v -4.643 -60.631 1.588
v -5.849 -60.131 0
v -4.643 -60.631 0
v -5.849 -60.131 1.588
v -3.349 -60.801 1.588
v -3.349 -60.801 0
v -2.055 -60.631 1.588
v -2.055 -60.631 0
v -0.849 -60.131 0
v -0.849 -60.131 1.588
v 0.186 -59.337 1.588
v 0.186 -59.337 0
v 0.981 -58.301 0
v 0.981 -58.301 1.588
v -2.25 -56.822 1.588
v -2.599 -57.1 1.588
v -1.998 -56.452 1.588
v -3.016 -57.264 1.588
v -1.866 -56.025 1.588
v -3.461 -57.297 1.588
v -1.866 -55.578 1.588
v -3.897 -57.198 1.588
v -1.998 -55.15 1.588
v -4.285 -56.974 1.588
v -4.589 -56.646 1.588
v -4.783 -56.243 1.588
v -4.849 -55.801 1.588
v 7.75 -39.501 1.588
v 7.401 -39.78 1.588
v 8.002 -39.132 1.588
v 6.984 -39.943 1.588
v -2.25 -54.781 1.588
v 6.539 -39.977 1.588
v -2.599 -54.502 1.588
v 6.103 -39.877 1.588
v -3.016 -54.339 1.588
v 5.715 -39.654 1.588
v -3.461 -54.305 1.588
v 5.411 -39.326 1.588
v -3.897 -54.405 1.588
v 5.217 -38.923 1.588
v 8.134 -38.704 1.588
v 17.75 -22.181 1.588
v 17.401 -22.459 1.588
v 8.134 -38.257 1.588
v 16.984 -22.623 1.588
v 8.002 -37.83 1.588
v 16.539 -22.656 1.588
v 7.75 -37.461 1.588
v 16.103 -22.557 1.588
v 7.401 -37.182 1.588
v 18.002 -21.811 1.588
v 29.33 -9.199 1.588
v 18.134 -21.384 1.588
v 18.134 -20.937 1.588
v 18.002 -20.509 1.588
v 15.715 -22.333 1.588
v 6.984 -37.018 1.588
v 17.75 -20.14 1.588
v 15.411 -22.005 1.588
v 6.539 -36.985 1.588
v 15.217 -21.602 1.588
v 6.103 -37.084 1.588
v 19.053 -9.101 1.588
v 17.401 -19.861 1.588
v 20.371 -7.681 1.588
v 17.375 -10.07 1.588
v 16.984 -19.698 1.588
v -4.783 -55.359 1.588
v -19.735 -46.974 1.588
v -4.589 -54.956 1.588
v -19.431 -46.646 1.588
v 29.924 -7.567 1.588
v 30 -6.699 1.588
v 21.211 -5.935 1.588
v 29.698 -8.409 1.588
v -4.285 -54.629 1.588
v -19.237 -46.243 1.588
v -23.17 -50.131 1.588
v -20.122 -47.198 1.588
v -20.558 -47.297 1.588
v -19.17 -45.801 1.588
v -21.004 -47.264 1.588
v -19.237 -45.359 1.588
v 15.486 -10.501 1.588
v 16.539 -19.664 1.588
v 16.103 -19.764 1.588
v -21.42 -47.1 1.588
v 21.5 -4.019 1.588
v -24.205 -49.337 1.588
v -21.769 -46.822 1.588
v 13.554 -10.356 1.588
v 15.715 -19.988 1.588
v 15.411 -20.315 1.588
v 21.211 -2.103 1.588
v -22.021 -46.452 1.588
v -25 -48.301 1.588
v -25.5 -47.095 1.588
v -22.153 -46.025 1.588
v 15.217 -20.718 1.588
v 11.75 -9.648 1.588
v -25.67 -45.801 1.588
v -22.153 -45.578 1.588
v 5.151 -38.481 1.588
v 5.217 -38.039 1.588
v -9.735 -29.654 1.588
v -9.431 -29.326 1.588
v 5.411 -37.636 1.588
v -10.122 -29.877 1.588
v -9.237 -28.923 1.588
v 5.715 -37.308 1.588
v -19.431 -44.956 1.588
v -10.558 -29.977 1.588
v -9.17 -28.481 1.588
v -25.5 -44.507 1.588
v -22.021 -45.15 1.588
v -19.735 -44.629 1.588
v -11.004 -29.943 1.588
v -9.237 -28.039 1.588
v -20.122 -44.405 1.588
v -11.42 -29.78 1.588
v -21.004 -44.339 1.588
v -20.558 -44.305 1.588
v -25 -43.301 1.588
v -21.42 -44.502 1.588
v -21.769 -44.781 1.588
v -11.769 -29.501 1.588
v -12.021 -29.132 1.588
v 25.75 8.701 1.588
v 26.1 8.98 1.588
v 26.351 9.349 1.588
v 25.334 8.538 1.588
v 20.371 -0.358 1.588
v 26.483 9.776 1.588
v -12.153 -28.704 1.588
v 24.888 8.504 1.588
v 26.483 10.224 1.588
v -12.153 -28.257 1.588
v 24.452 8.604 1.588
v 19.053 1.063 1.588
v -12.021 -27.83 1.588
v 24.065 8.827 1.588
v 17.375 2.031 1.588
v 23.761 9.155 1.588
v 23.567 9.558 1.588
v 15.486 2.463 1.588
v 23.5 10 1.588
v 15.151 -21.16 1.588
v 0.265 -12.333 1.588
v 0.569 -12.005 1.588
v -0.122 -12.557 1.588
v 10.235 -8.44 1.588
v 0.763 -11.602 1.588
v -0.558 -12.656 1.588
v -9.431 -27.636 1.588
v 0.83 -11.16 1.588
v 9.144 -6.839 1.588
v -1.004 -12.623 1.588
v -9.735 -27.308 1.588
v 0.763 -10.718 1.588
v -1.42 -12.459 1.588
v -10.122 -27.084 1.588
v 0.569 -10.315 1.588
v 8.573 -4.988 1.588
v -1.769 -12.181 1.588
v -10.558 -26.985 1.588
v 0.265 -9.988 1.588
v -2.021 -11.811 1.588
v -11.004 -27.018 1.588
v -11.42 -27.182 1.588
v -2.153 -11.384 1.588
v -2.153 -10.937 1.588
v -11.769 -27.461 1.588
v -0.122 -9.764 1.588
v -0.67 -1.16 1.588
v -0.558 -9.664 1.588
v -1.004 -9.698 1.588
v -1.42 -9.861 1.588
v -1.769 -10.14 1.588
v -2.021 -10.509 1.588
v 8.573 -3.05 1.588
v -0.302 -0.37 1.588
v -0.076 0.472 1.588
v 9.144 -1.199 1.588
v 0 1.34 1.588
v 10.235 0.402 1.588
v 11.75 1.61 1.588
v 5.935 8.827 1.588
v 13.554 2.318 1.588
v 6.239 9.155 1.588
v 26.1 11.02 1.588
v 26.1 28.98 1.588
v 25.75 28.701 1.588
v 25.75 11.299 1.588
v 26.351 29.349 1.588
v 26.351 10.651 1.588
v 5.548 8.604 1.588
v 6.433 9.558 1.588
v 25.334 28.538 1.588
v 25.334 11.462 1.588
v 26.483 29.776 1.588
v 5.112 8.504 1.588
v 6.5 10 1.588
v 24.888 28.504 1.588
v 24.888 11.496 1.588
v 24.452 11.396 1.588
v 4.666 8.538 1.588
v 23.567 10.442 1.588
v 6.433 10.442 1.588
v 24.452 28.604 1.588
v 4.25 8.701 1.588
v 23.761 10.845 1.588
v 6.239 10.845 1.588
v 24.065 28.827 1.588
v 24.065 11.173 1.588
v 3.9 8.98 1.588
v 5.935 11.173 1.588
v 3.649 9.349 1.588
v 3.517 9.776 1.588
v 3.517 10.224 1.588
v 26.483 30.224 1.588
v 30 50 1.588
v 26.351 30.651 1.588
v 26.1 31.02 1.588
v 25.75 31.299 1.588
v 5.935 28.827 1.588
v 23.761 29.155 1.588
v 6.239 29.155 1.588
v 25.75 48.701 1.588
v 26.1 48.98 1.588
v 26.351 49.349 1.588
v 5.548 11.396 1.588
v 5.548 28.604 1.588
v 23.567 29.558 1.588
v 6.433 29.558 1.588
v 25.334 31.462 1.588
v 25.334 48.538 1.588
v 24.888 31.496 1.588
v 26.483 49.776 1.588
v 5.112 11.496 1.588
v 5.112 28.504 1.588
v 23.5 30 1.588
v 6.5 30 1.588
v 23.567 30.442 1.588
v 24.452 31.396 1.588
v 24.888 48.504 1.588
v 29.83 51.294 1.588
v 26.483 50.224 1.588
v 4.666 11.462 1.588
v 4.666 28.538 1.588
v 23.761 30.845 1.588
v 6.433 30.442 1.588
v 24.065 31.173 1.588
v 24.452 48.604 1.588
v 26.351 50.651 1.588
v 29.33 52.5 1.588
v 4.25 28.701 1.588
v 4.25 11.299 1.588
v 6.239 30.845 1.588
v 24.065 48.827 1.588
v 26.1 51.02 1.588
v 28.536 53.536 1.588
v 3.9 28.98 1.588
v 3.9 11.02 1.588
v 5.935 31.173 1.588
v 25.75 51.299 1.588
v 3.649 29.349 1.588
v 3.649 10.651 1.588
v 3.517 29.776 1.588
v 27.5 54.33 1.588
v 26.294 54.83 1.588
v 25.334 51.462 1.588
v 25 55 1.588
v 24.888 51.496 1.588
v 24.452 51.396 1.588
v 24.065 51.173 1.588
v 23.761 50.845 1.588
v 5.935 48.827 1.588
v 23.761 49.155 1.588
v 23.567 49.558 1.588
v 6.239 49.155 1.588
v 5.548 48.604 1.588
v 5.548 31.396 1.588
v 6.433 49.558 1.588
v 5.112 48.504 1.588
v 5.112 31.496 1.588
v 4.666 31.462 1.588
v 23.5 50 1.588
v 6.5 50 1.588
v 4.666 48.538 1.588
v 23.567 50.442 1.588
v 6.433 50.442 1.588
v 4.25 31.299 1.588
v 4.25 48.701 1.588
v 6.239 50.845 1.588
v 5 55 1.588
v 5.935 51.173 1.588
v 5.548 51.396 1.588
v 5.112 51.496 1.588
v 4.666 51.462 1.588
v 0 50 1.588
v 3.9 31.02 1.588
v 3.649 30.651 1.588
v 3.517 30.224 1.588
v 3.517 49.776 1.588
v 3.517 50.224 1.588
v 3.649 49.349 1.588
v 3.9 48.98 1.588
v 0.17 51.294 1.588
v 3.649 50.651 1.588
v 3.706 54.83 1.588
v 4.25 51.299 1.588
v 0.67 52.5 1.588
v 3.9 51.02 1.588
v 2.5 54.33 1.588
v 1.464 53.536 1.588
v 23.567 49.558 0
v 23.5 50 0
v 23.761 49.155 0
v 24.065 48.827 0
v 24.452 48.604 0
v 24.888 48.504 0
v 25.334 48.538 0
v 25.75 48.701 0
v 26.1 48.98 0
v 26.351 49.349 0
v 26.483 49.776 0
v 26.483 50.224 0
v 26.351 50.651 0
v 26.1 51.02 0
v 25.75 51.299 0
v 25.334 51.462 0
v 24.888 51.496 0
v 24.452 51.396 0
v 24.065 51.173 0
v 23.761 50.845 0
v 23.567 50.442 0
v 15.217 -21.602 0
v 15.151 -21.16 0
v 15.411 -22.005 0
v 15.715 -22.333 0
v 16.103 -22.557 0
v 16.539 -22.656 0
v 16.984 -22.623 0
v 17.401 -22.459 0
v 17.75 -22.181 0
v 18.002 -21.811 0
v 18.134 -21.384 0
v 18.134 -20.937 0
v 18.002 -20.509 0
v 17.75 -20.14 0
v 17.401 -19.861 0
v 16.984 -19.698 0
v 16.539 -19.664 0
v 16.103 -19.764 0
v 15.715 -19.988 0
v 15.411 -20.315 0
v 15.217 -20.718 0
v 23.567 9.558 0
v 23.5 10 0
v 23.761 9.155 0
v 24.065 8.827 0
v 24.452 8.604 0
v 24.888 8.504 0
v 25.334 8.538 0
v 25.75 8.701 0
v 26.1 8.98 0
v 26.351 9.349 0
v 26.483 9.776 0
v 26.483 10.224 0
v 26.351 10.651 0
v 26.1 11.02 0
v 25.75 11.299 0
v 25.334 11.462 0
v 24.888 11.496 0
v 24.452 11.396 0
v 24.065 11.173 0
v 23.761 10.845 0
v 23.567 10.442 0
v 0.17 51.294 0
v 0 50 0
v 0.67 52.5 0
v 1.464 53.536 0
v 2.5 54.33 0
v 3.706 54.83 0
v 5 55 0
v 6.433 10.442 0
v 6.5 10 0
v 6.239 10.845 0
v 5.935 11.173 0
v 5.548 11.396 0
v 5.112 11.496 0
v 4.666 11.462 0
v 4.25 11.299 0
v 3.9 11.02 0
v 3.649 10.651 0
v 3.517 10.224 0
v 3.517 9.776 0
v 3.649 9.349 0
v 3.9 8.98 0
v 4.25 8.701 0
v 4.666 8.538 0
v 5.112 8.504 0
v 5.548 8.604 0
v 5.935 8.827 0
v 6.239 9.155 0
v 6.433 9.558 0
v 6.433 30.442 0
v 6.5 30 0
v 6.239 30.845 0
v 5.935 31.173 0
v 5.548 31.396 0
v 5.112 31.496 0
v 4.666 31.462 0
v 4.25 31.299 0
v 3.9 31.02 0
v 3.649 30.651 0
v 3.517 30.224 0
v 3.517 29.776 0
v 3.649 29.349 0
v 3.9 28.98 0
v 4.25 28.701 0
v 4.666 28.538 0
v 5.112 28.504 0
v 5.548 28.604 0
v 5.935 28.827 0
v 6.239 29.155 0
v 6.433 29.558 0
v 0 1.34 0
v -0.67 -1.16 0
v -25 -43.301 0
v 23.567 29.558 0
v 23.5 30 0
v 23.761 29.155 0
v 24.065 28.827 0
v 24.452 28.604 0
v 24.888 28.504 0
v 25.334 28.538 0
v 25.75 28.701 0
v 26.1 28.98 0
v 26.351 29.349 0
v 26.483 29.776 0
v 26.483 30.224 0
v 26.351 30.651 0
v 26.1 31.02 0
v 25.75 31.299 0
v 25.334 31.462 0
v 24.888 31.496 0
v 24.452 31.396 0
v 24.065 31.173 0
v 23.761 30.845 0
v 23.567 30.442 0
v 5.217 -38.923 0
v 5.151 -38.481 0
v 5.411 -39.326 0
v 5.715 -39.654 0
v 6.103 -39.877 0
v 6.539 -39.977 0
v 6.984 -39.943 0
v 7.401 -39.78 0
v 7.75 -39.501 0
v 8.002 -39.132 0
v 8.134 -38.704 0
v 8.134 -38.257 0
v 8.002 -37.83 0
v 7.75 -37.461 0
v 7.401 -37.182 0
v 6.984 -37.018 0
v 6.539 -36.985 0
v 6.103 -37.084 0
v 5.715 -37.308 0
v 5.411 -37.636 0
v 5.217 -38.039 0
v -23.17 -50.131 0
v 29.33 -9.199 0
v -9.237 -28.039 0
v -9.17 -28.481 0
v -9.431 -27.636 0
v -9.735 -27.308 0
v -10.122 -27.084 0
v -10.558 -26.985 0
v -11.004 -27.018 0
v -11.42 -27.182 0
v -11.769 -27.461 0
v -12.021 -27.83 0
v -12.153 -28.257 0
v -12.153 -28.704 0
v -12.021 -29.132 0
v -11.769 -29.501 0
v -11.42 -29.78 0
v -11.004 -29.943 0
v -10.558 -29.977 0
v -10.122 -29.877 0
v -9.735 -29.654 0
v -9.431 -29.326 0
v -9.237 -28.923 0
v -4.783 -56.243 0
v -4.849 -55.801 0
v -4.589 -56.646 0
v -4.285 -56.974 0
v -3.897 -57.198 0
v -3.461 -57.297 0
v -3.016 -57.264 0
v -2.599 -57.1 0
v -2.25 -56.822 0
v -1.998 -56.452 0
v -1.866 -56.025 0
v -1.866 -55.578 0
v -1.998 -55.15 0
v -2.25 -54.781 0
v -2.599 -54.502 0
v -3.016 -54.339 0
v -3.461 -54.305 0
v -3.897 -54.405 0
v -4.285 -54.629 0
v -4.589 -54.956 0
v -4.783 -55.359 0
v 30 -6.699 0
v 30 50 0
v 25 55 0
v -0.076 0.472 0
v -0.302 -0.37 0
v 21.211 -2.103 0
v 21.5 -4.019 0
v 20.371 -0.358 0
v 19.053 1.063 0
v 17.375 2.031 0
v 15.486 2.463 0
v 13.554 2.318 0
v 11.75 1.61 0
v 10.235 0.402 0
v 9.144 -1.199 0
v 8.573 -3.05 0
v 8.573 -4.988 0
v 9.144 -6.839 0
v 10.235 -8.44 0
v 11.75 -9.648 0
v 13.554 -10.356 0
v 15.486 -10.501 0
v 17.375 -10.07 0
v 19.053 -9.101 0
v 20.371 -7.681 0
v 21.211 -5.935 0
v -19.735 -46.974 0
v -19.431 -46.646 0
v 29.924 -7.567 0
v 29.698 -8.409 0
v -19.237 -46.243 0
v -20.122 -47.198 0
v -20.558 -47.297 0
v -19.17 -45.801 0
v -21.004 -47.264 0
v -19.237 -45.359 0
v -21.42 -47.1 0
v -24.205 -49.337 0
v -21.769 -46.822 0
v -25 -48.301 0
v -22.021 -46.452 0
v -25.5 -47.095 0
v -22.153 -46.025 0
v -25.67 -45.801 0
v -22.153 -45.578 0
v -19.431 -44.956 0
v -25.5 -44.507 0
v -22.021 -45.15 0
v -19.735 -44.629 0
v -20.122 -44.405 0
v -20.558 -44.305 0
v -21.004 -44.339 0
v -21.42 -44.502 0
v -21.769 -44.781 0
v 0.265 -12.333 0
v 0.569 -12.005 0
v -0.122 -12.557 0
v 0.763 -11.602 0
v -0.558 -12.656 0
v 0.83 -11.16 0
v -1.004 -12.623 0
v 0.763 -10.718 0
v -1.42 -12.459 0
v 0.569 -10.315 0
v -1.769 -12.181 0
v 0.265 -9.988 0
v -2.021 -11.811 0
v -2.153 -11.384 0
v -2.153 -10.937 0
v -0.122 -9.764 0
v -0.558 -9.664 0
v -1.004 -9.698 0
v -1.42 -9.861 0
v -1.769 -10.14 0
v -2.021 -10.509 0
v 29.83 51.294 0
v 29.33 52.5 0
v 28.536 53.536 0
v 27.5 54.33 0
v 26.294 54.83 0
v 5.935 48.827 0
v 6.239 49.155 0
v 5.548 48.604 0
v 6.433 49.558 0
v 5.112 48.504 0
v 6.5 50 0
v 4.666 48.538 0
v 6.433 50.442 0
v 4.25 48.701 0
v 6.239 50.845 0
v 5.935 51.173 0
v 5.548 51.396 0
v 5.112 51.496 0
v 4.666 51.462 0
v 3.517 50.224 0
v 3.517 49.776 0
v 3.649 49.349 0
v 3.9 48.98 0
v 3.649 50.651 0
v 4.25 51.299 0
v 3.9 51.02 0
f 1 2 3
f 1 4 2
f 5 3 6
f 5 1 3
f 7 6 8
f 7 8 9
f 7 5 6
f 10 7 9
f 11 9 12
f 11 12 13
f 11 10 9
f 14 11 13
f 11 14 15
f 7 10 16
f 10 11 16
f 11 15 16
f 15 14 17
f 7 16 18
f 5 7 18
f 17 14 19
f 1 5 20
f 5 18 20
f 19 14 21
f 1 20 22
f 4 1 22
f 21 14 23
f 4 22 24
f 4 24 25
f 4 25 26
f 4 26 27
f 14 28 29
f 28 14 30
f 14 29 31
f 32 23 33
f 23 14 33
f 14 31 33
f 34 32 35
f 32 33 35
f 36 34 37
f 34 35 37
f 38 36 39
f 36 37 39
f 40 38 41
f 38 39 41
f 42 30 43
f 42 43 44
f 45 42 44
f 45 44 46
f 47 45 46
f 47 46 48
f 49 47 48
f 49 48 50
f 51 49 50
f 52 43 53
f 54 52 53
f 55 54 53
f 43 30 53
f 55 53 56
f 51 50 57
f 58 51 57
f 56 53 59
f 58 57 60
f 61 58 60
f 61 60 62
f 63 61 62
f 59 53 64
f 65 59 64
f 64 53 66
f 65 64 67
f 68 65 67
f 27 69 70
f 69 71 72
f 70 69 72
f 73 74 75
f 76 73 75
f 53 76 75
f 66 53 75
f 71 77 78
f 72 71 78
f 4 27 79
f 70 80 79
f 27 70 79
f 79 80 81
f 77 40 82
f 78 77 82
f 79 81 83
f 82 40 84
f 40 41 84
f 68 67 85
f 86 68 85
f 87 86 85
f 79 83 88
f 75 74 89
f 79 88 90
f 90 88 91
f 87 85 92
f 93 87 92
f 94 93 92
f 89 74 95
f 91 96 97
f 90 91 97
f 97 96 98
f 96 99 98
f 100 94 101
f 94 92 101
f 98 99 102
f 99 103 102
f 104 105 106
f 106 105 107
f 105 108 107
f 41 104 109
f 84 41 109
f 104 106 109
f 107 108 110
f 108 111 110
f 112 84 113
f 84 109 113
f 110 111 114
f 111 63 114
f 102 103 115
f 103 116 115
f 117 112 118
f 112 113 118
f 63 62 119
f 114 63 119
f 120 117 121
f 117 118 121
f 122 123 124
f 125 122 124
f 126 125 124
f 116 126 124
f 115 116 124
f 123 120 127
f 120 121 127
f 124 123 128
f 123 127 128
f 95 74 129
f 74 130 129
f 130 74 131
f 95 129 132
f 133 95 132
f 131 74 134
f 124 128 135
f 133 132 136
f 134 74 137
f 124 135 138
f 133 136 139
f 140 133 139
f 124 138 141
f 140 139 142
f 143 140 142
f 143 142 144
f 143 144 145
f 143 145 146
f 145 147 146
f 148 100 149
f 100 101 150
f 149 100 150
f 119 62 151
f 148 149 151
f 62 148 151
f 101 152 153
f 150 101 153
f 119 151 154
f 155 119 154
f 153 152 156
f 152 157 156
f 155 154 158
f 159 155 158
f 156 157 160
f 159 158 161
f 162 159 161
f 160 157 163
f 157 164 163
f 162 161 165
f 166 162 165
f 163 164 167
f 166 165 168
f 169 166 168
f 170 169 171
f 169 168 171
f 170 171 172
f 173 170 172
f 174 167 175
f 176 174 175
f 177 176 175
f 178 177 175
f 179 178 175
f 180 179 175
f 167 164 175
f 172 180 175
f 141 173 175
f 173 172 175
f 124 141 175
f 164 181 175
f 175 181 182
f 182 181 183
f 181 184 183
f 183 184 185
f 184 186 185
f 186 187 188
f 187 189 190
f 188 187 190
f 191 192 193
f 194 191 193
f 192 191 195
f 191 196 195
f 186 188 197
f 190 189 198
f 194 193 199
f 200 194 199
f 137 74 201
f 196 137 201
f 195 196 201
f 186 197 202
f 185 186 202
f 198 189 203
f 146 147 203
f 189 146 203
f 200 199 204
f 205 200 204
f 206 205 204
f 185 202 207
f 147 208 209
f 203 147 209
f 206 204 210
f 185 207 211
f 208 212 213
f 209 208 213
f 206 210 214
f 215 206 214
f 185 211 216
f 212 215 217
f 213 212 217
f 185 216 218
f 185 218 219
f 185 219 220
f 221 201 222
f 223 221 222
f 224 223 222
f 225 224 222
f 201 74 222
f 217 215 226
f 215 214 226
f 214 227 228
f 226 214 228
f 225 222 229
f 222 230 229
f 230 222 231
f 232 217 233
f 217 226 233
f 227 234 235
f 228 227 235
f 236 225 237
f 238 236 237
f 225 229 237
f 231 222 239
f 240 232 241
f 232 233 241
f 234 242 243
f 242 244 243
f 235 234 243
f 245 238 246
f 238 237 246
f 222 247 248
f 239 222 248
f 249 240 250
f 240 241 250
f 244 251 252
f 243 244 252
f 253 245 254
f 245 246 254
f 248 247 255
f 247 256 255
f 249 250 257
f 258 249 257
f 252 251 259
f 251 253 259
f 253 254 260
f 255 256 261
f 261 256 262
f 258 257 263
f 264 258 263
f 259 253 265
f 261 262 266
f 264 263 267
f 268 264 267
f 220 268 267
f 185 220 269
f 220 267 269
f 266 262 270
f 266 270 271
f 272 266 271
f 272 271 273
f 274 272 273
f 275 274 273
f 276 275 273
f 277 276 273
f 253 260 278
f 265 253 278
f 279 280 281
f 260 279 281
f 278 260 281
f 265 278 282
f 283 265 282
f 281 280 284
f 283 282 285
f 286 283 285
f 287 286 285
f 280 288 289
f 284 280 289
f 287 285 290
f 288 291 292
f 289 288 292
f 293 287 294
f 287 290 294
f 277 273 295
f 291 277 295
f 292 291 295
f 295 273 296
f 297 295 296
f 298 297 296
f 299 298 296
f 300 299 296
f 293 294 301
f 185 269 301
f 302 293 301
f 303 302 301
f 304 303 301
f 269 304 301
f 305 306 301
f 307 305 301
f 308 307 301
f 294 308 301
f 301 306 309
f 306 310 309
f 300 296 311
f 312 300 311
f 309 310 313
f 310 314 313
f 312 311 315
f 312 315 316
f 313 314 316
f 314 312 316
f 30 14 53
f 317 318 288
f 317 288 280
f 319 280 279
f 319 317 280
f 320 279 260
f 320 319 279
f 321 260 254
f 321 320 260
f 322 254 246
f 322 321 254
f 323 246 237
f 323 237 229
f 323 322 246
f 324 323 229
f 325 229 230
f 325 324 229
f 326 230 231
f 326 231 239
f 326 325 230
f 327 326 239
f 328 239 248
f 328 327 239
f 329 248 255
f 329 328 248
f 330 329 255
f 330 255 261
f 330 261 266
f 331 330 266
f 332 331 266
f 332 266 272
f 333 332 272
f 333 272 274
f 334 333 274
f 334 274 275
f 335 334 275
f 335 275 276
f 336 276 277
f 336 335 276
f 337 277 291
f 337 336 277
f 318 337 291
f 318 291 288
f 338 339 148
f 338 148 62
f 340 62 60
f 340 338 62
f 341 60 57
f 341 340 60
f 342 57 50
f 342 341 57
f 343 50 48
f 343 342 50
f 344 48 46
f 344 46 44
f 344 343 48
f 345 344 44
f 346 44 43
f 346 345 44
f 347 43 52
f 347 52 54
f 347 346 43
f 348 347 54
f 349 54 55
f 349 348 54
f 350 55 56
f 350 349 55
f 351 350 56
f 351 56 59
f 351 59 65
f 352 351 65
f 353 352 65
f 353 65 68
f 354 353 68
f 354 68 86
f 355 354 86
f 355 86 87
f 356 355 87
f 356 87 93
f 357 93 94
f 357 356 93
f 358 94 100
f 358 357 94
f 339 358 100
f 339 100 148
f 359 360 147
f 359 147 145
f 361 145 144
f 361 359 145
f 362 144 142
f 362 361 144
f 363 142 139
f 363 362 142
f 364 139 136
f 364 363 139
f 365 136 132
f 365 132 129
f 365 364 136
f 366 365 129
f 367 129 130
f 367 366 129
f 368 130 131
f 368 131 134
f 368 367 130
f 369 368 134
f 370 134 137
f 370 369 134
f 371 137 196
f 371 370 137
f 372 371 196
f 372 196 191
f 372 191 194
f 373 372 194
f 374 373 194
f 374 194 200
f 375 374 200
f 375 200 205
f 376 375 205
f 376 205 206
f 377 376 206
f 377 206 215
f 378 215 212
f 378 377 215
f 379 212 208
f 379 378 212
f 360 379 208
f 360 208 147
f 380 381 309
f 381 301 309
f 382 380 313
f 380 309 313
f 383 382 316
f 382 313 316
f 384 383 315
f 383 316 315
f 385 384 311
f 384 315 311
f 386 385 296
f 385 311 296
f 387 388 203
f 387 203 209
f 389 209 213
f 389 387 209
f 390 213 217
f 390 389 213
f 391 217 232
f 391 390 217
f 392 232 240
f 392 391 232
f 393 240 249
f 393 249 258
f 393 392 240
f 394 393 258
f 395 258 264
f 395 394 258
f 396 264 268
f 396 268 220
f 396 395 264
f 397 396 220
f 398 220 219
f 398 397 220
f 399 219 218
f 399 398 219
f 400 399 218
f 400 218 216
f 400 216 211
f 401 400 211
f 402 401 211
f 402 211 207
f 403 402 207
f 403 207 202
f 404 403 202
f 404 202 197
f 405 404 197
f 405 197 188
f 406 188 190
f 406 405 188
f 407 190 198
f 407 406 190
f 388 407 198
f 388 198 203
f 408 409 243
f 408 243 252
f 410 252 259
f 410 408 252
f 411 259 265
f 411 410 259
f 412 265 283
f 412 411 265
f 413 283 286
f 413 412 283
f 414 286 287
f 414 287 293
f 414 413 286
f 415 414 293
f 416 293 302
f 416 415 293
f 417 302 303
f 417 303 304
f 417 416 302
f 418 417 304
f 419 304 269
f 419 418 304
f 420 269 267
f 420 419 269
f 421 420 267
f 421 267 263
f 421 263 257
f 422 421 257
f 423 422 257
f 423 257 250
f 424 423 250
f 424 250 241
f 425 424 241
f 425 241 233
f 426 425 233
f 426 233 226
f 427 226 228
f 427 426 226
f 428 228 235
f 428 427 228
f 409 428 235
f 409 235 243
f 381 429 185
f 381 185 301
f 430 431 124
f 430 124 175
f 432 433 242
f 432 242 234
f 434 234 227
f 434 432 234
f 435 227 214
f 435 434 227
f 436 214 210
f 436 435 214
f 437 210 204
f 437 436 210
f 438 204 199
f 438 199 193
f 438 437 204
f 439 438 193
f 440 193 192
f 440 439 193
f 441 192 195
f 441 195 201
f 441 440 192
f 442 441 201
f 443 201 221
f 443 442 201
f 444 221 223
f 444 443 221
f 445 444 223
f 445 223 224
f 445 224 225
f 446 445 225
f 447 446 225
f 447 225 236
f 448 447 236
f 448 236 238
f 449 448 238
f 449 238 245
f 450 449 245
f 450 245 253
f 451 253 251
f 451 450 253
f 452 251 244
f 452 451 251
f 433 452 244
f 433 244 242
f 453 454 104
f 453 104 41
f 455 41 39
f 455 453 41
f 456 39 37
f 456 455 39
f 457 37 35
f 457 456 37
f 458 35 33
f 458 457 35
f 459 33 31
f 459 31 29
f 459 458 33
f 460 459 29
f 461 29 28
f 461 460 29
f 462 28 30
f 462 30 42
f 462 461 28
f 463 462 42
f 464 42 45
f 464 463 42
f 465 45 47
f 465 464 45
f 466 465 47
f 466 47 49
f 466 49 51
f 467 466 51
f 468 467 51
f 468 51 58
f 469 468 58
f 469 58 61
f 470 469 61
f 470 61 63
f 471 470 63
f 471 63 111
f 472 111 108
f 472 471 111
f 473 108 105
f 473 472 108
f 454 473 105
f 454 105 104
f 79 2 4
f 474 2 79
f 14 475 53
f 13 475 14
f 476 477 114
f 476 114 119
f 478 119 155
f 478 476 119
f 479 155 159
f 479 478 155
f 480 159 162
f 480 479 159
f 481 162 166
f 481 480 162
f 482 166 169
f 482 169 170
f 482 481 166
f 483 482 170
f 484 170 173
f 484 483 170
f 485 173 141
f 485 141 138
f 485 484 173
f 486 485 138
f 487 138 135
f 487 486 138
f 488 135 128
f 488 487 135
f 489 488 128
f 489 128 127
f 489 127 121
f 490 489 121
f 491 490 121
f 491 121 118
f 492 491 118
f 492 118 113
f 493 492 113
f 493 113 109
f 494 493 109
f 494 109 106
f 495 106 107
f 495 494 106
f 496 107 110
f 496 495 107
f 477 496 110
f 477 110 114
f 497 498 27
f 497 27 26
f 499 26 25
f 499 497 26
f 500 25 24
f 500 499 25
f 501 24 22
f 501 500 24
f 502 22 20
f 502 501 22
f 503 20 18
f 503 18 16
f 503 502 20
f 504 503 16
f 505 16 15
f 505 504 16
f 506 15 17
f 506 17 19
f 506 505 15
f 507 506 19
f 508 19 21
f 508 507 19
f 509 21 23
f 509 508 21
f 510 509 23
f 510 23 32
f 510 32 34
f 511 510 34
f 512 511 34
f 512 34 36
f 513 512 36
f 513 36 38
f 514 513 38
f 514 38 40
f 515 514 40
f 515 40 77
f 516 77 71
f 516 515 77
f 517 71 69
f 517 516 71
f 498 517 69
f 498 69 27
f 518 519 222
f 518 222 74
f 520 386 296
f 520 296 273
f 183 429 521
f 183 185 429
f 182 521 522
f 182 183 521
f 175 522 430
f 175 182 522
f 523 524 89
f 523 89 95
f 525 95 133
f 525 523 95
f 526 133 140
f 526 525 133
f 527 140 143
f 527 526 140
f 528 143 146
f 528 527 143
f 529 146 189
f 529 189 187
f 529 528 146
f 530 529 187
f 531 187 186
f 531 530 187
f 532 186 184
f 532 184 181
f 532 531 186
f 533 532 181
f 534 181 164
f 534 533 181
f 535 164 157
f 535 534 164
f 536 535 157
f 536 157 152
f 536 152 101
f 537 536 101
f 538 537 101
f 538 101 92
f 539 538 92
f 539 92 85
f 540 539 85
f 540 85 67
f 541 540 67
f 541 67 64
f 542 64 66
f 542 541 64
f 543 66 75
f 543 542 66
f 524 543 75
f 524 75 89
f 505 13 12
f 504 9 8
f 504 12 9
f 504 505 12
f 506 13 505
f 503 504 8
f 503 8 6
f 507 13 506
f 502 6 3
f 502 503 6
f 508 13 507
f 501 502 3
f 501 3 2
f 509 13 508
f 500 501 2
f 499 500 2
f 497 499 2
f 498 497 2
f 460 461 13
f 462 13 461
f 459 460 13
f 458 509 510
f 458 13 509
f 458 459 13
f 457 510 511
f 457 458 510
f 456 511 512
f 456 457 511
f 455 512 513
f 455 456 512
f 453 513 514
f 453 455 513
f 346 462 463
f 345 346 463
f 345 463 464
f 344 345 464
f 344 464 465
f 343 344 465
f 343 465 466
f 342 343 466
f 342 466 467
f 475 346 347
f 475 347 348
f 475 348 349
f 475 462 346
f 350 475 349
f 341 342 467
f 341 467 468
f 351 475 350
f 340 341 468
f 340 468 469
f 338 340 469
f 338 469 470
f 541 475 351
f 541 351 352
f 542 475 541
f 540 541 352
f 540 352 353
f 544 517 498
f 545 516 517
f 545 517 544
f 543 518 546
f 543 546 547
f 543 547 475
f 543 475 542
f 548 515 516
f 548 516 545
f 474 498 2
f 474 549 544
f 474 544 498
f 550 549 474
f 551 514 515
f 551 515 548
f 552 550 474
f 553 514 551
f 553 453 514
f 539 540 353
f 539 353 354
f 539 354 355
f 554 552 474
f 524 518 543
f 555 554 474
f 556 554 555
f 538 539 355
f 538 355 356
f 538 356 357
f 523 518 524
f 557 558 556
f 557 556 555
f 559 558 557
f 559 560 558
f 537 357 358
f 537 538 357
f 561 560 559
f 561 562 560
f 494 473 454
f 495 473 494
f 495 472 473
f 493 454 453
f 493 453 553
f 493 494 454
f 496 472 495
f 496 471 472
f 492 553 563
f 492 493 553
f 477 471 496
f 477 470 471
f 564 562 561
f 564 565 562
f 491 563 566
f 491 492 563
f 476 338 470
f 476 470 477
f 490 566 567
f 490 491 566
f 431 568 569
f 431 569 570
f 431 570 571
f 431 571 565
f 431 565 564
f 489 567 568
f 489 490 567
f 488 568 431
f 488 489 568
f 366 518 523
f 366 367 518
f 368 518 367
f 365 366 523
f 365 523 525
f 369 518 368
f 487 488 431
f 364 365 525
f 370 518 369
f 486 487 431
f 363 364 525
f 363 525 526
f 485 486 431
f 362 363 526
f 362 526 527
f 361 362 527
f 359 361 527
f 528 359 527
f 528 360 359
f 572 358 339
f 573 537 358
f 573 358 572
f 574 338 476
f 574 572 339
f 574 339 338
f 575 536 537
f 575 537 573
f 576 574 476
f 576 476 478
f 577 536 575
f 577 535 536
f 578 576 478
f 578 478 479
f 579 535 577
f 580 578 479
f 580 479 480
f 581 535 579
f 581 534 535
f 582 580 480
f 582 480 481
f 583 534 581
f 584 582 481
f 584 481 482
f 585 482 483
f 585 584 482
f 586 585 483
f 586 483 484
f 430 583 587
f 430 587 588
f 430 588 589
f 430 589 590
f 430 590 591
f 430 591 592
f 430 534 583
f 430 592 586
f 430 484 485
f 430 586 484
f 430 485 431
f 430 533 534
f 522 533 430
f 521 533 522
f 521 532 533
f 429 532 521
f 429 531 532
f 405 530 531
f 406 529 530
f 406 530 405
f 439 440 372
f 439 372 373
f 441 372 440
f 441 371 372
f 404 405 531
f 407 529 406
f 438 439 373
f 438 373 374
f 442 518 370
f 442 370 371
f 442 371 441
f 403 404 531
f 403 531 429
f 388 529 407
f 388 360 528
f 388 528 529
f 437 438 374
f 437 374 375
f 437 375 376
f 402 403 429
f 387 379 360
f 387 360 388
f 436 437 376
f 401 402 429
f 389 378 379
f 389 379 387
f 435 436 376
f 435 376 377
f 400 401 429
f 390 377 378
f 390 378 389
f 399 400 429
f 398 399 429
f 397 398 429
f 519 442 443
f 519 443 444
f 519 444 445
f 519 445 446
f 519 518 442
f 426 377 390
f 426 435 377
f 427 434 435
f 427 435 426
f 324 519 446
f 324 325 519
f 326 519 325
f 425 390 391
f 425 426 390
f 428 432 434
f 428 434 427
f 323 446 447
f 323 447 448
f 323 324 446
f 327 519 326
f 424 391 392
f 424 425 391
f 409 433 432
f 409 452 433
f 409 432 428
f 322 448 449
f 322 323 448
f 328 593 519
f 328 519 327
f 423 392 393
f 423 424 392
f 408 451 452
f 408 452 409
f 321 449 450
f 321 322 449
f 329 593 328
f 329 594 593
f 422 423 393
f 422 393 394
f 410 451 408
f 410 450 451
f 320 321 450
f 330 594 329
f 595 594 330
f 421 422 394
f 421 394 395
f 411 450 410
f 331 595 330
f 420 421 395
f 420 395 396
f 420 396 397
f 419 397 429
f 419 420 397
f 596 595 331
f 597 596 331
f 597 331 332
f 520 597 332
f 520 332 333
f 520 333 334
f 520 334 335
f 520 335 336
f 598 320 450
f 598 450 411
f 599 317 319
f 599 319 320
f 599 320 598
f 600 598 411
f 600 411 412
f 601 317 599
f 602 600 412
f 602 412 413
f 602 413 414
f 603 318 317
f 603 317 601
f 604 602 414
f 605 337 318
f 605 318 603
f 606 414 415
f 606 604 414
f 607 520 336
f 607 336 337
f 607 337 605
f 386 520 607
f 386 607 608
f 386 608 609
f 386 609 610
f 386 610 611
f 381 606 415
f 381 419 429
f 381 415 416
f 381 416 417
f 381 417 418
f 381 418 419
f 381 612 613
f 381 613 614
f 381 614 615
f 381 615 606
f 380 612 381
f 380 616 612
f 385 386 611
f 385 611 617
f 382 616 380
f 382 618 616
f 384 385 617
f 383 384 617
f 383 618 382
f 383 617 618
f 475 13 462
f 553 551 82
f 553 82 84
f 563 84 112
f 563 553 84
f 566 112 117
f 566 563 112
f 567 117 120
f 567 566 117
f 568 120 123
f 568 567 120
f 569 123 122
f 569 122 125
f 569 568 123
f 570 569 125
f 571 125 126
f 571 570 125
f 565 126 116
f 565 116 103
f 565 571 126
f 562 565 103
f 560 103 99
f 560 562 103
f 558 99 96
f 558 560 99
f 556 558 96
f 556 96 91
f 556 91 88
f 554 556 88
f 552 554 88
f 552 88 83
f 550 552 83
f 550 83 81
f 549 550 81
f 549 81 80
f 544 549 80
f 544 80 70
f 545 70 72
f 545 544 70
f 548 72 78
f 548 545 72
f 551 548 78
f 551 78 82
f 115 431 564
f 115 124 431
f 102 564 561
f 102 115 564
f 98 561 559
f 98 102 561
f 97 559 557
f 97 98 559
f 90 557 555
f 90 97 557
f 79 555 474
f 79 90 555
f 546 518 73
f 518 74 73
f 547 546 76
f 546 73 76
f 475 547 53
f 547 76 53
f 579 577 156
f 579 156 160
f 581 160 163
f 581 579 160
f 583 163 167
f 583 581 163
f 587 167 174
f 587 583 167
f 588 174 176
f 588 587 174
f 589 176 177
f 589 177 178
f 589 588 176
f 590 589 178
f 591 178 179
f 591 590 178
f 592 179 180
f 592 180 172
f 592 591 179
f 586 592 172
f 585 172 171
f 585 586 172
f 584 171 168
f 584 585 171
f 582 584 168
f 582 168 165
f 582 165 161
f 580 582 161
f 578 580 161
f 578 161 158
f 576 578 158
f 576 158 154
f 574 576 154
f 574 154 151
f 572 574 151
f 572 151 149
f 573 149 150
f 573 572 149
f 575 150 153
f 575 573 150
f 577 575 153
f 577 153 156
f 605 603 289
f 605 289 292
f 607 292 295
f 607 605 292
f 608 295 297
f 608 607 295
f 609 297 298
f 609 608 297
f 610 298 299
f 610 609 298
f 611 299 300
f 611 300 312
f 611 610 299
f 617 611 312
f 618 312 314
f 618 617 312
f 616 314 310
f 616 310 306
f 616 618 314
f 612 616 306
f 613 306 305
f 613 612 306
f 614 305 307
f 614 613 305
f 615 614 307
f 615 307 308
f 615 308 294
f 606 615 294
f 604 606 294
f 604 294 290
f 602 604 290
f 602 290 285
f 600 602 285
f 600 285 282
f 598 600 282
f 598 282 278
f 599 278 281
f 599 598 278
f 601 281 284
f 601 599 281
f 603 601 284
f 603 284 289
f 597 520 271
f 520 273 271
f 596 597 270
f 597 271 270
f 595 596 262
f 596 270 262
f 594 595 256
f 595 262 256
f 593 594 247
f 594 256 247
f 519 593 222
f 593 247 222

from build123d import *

# Parameters (mm, degrees)
SKETCH1_R           = 6.5
SKETCH1_R_2         = 1.5
BOSS_EXTRUDE1_DEPTH = 1.5875
FILLET1_R           = 5


with BuildPart() as part:
    # Sketch1 → Boss-Extrude1 (new body)
    with BuildSketch(Plane.XY):
        Polygon((0, 0), (0, 55), (30, 55), (30, -8.038475773), (-1.519237886, -62.631397208), (-27.5, -47.631397208), align=None)
        with Locations((15, -4.019237886)):
            Circle(SKETCH1_R, mode=Mode.SUBTRACT)
        with Locations((5, 50)):
            Circle(SKETCH1_R_2, mode=Mode.SUBTRACT)
        with Locations((5, 30)):
            Circle(SKETCH1_R_2, mode=Mode.SUBTRACT)
        with Locations((5, 10)):
            Circle(SKETCH1_R_2, mode=Mode.SUBTRACT)
        with Locations(Location((25, 10, 0), (0, 0, 180))):
            Circle(SKETCH1_R_2, mode=Mode.SUBTRACT)
        with Locations(Location((25, 30, 0), (0, 0, 180))):
            Circle(SKETCH1_R_2, mode=Mode.SUBTRACT)
        with Locations(Location((25, 50, 0), (0, 0, 180))):
            Circle(SKETCH1_R_2, mode=Mode.SUBTRACT)
        with Locations((-20.669872981, -45.801270189)):
            Circle(SKETCH1_R_2, mode=Mode.SUBTRACT)
        with Locations((-10.669872981, -28.480762114)):
            Circle(SKETCH1_R_2, mode=Mode.SUBTRACT)
        with Locations((-0.669872981, -11.160254038)):
            Circle(SKETCH1_R_2, mode=Mode.SUBTRACT)
        with Locations(Location((16.650635095, -21.160254038, 0), (0, 0, 180))):
            Circle(SKETCH1_R_2, mode=Mode.SUBTRACT)
        with Locations(Location((6.650635095, -38.480762114, 0), (0, 0, 180))):
            Circle(SKETCH1_R_2, mode=Mode.SUBTRACT)
        with Locations(Location((-3.349364905, -55.801270189, 0), (0, 0, 180))):
            Circle(SKETCH1_R_2, mode=Mode.SUBTRACT)
    extrude(amount=BOSS_EXTRUDE1_DEPTH)

    # Fillet1
    fillet1_edges = [part.edges().sort_by_distance(p)[0] for p in [
        (0, 0, 0.79375),
        (0, 55, 0.79375),
        (30, 55, 0.79375),
        (30, -8.038475773, 0.79375),
        (-1.519237886, -62.631397208, 0.79375),
        (-27.5, -47.631397208, 0.79375),
    ]]
    fillet(fillet1_edges, radius=FILLET1_R)


solid = part.part
